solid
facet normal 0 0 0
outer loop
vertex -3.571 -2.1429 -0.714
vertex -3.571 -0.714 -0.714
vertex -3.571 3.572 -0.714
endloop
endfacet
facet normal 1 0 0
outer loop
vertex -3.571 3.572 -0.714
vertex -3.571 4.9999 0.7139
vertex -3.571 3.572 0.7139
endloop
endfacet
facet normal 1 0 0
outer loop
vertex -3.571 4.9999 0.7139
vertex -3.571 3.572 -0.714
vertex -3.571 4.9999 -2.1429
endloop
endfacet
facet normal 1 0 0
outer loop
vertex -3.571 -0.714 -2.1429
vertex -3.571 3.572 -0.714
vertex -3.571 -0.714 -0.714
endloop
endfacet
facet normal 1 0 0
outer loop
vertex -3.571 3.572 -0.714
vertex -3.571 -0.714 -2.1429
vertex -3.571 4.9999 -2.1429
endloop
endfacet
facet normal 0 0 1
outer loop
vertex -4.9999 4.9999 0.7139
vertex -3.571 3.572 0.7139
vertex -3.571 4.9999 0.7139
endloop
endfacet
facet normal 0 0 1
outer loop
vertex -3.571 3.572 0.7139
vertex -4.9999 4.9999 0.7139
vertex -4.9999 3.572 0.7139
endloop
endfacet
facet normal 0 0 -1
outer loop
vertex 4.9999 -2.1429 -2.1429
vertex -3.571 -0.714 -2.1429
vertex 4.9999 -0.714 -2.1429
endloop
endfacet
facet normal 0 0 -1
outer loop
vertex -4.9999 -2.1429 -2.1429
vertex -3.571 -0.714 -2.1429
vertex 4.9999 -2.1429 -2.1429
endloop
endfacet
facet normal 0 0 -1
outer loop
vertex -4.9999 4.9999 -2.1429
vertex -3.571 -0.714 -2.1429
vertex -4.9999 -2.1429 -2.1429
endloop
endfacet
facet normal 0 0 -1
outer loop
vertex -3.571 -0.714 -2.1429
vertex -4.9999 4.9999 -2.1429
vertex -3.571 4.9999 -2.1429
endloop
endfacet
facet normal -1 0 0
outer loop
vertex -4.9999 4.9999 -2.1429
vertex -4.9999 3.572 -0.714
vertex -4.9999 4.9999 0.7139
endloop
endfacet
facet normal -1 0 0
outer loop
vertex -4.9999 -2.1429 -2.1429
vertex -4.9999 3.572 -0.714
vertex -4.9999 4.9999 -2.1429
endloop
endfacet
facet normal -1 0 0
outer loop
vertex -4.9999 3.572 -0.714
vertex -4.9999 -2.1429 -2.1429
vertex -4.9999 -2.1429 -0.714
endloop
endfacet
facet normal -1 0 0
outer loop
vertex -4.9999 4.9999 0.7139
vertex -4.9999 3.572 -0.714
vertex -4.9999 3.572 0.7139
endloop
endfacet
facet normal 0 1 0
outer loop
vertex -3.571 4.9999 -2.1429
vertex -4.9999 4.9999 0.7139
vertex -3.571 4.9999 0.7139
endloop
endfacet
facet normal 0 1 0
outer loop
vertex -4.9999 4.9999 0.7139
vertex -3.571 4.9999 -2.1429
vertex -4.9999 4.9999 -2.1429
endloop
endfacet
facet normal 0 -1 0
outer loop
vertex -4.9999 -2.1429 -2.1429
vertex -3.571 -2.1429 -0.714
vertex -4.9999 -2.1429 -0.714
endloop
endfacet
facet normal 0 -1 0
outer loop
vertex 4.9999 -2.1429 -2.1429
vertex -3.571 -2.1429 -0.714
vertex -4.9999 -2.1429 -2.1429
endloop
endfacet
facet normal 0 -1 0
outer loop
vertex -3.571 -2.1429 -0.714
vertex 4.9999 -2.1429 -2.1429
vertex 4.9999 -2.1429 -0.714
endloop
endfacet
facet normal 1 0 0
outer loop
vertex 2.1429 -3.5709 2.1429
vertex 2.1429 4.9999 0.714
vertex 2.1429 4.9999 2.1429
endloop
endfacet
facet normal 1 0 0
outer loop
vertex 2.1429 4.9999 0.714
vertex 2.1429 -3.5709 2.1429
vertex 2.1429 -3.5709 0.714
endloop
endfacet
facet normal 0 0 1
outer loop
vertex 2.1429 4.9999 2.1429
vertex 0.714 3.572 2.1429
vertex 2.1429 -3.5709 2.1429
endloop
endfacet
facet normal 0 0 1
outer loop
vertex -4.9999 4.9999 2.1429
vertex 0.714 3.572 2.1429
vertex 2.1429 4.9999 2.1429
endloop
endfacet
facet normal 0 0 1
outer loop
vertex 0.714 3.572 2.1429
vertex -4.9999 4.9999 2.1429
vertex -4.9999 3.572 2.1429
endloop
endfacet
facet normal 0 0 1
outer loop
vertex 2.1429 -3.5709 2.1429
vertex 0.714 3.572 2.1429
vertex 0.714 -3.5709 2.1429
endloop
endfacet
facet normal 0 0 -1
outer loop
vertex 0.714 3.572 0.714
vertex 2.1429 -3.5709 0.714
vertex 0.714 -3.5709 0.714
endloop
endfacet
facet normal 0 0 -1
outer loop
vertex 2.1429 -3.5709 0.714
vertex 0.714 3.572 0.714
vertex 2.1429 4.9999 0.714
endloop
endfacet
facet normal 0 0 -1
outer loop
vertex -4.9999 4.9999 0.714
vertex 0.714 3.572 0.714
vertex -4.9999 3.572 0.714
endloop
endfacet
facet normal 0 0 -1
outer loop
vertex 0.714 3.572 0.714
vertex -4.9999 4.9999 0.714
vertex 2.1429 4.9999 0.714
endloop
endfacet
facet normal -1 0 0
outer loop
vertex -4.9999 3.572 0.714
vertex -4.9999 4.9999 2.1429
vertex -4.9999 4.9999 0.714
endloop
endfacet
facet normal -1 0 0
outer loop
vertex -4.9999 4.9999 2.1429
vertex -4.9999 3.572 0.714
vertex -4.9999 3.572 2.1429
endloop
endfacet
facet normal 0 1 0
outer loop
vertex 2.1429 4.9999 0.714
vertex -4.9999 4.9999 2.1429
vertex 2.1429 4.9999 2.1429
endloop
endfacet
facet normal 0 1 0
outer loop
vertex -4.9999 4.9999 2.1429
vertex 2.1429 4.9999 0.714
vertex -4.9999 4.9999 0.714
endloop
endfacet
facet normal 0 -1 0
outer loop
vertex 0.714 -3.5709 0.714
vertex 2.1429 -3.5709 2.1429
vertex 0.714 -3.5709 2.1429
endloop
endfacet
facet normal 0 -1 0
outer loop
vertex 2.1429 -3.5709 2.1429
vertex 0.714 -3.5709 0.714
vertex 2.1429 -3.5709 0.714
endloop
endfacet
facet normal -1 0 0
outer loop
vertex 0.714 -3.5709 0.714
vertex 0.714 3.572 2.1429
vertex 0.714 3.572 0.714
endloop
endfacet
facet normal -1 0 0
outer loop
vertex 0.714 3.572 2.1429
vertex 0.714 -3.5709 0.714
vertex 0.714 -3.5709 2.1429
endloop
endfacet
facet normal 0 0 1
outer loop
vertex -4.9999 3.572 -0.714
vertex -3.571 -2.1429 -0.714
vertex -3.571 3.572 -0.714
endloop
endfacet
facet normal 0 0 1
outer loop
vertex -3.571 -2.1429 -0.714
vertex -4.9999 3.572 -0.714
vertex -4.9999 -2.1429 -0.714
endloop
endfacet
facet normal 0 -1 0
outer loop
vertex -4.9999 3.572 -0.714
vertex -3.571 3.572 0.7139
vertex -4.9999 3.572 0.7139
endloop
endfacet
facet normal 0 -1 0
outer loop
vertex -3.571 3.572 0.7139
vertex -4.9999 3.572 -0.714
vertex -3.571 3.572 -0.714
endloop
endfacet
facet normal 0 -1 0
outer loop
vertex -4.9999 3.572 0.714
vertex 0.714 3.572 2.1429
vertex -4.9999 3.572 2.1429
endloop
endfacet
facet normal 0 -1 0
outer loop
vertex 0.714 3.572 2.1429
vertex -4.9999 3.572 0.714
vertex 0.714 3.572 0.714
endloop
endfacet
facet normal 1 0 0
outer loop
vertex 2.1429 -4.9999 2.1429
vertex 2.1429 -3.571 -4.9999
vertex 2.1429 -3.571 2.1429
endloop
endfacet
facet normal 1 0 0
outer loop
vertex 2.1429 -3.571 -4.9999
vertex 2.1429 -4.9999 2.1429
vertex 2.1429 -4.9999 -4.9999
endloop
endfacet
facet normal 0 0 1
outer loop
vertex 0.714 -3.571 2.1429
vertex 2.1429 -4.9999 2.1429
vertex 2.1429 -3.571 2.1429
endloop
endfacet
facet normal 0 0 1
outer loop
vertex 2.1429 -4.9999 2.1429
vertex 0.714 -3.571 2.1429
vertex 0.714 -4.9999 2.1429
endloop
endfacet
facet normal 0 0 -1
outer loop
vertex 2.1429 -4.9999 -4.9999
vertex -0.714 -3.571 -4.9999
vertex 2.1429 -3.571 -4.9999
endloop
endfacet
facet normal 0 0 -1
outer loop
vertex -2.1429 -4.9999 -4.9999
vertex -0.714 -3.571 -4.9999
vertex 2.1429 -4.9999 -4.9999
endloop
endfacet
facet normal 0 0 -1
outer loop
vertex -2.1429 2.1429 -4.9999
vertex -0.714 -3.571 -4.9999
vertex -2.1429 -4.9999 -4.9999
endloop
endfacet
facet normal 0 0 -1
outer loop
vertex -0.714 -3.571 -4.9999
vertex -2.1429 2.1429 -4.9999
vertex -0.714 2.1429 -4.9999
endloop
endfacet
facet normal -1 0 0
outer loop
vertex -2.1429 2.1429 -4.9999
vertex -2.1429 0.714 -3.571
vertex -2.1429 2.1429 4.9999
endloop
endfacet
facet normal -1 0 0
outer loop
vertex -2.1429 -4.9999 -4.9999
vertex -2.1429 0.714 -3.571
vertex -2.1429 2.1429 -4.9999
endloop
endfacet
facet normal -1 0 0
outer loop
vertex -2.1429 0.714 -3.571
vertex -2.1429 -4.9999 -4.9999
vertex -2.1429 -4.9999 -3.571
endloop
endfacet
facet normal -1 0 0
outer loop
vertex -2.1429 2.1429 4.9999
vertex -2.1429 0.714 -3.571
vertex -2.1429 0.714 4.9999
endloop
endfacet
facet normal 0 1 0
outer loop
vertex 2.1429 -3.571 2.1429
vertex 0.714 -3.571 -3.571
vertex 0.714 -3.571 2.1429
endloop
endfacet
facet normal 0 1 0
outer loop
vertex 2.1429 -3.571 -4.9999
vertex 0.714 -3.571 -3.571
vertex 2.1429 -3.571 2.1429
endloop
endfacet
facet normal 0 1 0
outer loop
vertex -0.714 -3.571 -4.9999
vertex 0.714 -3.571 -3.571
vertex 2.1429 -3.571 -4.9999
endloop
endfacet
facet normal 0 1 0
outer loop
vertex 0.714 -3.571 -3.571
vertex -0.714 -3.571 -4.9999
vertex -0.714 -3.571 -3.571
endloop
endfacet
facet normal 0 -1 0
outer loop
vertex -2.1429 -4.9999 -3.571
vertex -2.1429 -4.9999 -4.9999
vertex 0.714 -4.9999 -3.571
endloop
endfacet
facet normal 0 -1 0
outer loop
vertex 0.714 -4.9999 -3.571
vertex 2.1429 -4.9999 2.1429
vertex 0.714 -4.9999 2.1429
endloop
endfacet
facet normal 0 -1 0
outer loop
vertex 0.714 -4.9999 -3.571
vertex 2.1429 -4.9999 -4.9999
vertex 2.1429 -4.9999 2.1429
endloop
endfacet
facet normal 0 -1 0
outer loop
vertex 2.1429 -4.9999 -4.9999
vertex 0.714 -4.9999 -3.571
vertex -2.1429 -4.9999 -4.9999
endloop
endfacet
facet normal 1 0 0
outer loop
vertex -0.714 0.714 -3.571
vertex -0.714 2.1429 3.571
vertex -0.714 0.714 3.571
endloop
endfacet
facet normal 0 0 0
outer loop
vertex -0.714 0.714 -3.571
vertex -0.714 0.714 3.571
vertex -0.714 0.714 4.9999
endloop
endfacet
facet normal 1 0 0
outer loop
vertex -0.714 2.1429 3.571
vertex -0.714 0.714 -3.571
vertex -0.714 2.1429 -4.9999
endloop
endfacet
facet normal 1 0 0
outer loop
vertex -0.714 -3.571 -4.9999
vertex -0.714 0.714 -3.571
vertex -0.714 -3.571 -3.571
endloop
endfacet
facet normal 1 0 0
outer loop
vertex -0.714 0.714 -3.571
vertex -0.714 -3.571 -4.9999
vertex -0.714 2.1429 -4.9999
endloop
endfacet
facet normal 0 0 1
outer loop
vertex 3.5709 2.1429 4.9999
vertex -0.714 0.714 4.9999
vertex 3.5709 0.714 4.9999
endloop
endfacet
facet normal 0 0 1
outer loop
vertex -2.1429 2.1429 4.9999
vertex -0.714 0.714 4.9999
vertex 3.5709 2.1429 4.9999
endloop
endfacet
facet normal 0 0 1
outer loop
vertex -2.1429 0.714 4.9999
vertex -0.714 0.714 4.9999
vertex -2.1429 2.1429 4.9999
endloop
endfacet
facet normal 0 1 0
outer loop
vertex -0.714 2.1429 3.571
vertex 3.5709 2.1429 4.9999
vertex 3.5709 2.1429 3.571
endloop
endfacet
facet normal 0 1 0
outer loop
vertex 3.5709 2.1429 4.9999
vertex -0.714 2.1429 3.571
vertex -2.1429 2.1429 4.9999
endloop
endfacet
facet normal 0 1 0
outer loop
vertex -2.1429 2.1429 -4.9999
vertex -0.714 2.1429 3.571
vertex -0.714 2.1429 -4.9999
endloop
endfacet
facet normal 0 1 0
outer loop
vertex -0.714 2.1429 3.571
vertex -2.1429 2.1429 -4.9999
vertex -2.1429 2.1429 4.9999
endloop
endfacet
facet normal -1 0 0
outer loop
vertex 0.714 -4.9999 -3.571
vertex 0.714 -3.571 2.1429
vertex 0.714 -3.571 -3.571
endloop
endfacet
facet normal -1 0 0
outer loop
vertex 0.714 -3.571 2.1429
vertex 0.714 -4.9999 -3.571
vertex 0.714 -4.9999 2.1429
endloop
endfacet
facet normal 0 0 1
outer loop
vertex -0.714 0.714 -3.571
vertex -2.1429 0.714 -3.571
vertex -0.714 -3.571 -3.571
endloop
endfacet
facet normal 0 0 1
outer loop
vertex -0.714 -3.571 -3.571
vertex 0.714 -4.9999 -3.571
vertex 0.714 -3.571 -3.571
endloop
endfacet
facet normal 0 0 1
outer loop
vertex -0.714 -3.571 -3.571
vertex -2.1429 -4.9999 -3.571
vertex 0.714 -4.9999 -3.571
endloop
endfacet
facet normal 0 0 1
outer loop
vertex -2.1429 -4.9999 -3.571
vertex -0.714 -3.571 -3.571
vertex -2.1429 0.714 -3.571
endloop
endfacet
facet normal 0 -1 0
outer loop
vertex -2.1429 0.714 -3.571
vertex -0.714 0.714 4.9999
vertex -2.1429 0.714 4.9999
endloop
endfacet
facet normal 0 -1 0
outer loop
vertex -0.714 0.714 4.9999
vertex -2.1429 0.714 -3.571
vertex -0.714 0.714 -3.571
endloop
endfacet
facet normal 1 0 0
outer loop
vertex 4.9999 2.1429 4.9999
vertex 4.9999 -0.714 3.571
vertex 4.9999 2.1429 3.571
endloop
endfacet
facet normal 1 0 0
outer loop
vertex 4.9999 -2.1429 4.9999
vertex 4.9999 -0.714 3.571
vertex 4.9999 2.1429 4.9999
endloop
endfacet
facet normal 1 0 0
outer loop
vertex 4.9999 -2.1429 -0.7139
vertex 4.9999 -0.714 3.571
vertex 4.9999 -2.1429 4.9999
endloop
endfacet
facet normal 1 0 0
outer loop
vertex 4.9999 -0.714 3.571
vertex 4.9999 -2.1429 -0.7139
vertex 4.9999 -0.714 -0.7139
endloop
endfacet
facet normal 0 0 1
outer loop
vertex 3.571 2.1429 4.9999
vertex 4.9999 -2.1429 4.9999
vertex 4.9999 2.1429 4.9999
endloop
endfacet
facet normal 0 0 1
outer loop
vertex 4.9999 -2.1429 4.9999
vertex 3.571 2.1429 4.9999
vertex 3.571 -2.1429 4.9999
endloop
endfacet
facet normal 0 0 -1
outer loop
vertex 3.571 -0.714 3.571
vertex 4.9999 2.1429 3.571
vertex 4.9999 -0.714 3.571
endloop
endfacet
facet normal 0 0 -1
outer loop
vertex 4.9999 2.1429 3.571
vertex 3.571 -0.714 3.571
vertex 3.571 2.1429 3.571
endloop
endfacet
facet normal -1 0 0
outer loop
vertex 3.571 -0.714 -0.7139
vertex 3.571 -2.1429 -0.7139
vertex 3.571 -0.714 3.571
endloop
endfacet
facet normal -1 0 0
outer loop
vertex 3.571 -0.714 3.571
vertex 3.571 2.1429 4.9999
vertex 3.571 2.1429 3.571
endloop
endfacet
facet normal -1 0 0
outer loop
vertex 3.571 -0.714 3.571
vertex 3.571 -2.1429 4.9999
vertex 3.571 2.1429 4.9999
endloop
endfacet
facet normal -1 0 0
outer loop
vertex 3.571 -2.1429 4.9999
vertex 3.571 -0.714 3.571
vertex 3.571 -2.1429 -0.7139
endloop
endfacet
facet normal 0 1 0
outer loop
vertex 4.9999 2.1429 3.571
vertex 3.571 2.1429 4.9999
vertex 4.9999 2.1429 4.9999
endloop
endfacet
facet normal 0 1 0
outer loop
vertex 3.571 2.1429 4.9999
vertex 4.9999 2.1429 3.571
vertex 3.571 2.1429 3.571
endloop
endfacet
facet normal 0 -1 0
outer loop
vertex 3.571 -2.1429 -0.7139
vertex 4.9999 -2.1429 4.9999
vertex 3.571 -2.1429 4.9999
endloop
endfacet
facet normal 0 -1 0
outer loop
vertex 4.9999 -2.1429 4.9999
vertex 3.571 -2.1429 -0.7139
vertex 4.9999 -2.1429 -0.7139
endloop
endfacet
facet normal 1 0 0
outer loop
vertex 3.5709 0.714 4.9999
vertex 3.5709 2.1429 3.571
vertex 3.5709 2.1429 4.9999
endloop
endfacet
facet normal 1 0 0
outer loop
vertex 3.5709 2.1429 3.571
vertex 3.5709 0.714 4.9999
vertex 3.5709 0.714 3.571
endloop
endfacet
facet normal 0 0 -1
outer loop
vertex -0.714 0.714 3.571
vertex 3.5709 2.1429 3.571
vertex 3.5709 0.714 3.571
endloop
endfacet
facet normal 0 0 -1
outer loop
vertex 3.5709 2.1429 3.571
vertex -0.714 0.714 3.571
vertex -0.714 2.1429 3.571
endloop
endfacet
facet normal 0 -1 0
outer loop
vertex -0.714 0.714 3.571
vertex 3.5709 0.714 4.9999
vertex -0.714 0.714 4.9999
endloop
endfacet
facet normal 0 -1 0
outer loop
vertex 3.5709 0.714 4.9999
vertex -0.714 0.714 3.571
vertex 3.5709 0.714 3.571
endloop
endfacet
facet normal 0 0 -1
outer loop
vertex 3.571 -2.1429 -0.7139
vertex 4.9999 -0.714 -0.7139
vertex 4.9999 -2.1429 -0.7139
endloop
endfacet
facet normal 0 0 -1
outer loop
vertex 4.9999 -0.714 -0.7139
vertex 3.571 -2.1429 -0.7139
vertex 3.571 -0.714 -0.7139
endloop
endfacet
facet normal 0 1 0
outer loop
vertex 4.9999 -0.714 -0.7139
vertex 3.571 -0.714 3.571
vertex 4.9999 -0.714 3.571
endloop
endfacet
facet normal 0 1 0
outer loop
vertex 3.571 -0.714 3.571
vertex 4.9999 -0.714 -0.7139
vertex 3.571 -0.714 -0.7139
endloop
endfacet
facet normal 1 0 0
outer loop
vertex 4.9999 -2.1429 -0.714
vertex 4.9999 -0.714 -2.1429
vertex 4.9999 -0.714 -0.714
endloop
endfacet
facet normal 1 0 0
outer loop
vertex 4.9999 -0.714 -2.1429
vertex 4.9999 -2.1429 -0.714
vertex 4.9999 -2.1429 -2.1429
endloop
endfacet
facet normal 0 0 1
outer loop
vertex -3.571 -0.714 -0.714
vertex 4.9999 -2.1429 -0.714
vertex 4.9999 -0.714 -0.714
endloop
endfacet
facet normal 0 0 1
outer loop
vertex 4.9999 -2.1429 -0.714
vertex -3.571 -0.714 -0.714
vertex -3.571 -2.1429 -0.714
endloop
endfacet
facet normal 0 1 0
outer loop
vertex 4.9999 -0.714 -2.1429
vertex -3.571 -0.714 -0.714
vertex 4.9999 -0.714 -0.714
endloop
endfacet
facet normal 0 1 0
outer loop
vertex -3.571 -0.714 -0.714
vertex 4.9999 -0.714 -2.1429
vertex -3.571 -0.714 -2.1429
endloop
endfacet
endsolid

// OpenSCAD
intersection() {
  cube(size = [11.9999, 11.9999, 11.9999], center = true);

  union() {
    translate([4.2855, 0, 4.2855])
    cube(size = [1.4289, 4.2859, 1.4289], center = true);
  
    translate([0.714, 1.4285, 4.2855])
    cube(size = [5.7139, 1.4289, 1.4289], center = true);
  
    difference() {
      union() {
        translate([-4.2855, 1.4285, -0.7145])
        cube(size = [1.4289, 7.1429, 2.8569], center = true);
      
        translate([-1.4285, 0.7145, 1.4285])
        cube(size = [7.1429, 8.5709, 1.4289], center = true);
      }
    
      translate([-8.693, 0.0005, 0.7145])
      cube(size = [18.814, 7.143, 2.857], center = true);
    }
  
    translate([4.2855, -1.4285, 1.429])
    cube(size = [1.4289, 1.4289, 4.2859], center = true);
  
    translate([0, -1.4285, -1.4285])
    cube(size = [9.9999, 1.4289, 1.4289], center = true);
  
    difference() {
      union() {
        translate([0, -4.2855, -1.4285])
        cube(size = [4.2859, 1.4289, 7.1429], center = true);
      
        translate([-1.4285, -1.4285, 0])
        cube(size = [1.4289, 7.1429, 9.9999], center = true);
      }
    
      translate([-0.7145, -2.143, 0.7145])
      cube(size = [2.857, 5.714, 8.571], center = true);
    }
  }
}
